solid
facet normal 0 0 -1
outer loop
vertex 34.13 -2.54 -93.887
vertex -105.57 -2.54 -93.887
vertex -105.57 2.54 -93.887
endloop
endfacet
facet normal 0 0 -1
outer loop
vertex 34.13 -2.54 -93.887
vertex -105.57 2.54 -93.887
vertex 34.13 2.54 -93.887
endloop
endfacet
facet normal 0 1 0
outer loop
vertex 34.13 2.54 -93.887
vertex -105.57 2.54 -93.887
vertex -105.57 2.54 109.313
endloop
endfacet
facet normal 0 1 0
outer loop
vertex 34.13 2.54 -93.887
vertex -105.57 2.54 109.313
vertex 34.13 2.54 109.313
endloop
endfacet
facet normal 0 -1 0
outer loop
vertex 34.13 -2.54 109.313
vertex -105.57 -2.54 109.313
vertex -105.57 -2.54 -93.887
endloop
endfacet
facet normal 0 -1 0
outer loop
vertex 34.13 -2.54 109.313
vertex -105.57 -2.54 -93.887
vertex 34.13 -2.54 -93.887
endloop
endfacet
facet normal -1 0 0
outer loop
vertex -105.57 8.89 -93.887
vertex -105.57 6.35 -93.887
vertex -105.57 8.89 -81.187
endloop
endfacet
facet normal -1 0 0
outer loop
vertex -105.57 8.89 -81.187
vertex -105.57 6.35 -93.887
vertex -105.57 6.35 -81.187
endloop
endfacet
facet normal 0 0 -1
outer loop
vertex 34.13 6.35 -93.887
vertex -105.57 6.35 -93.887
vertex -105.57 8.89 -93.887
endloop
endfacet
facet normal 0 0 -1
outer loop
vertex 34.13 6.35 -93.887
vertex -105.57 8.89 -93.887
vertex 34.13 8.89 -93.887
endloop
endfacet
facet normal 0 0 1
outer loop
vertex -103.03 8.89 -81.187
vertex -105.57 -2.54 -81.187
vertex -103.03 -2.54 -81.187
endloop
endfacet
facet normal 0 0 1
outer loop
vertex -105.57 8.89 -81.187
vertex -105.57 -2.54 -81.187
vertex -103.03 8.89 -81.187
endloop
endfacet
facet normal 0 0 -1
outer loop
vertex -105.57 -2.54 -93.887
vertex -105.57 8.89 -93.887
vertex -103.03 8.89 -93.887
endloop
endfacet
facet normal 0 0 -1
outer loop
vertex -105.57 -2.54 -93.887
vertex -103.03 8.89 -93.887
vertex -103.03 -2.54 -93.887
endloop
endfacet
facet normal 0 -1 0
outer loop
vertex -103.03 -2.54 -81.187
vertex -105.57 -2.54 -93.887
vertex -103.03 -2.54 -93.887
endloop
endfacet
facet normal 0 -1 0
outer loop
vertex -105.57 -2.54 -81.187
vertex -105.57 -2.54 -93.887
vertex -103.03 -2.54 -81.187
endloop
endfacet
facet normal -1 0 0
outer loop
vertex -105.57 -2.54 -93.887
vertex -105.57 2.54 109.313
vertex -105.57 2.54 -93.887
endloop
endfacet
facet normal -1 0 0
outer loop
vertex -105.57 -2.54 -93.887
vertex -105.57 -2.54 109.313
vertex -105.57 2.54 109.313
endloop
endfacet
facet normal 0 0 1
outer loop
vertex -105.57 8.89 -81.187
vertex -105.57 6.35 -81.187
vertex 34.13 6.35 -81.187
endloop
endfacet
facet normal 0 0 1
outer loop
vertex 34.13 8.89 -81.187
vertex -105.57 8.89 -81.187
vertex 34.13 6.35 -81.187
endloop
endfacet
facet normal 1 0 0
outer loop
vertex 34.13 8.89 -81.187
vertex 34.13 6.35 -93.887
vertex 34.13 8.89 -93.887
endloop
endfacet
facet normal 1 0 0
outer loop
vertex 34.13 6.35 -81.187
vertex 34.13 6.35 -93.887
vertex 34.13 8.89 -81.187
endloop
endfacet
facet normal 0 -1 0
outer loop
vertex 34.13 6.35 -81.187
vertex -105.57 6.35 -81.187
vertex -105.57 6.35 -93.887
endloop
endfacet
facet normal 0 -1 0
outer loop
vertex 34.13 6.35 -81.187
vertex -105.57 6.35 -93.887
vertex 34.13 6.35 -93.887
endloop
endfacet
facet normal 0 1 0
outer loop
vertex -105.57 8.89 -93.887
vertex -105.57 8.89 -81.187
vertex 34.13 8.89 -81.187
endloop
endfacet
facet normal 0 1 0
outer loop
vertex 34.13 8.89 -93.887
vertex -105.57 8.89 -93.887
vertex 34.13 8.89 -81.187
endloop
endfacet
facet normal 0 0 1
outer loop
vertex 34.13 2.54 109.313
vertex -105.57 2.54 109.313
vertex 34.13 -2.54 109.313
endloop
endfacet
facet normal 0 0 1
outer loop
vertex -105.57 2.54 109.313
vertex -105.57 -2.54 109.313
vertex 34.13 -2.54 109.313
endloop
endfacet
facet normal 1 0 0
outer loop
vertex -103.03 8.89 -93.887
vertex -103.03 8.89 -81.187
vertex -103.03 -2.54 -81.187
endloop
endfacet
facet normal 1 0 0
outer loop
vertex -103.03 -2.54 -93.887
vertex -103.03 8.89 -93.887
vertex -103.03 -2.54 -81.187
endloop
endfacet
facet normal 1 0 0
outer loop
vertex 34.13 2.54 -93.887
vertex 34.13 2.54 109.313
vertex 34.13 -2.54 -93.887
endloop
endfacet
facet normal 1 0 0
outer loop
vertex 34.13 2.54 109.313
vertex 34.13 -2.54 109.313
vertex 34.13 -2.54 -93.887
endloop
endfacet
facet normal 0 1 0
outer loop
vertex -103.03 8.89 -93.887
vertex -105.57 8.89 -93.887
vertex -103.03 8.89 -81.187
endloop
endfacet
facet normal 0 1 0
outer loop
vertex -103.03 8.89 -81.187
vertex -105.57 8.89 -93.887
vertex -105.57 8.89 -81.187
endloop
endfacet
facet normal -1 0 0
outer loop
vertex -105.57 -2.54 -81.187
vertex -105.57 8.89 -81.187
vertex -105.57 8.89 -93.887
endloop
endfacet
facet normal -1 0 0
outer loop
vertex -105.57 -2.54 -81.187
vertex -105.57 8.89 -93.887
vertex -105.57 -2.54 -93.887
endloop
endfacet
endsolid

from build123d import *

# Parameters (mm, degrees)
F0_W      = 139.7
F0_H      = 203.2
F1_DEPTH  = 2.54
F3_W      = 139.7
F3_H      = 12.7
F1_FACE_W = 139.7
F1_FACE_H = 203.2
F4_DEPTH  = 2.54
F5_W      = 6.35
F5_H      = 12.7
F5_W_2    = 5.08
F6_DEPTH  = 2.54


with BuildPart() as f1:
    # F0 (on Front) → F1 (new body)
    with BuildSketch(Plane.XZ):
        with Locations((-35.7197444822, 7.7129285783)):
            Rectangle(F0_W, F0_H)
    extrude(amount=F1_DEPTH)

    # F3 (on offset) + F1_face (on face) → F4 (join)
    with BuildSketch(Plane.XZ.offset(-6.35)):
        with Locations((-35.7197444822, -87.5370714217)):
            Rectangle(F3_W, F3_H)
    with BuildSketch(Plane(origin=(-35.7197444822, 0, 7.7129285783), x_dir=(1, 0, 0), z_dir=(0, 1, 0))):
        Rectangle(F1_FACE_W, F1_FACE_H)
    extrude(amount=-F4_DEPTH, dir=(0, -1, 0))


with BuildPart() as f6:
    # F5 (on face) → F6 (new body)
    with BuildSketch(Plane(origin=(-105.5697444822, 0, 0), x_dir=(0, -1, 0), z_dir=(-1, 0, 0))):
        with Locations((-5.715, -87.5370714217)):
            Rectangle(F5_W, F5_H)
        with Locations((0, -87.5370714217)):
            Rectangle(F5_W_2, F5_H)
    extrude(amount=-F6_DEPTH)


solid = Compound([f1.part, f6.part])
